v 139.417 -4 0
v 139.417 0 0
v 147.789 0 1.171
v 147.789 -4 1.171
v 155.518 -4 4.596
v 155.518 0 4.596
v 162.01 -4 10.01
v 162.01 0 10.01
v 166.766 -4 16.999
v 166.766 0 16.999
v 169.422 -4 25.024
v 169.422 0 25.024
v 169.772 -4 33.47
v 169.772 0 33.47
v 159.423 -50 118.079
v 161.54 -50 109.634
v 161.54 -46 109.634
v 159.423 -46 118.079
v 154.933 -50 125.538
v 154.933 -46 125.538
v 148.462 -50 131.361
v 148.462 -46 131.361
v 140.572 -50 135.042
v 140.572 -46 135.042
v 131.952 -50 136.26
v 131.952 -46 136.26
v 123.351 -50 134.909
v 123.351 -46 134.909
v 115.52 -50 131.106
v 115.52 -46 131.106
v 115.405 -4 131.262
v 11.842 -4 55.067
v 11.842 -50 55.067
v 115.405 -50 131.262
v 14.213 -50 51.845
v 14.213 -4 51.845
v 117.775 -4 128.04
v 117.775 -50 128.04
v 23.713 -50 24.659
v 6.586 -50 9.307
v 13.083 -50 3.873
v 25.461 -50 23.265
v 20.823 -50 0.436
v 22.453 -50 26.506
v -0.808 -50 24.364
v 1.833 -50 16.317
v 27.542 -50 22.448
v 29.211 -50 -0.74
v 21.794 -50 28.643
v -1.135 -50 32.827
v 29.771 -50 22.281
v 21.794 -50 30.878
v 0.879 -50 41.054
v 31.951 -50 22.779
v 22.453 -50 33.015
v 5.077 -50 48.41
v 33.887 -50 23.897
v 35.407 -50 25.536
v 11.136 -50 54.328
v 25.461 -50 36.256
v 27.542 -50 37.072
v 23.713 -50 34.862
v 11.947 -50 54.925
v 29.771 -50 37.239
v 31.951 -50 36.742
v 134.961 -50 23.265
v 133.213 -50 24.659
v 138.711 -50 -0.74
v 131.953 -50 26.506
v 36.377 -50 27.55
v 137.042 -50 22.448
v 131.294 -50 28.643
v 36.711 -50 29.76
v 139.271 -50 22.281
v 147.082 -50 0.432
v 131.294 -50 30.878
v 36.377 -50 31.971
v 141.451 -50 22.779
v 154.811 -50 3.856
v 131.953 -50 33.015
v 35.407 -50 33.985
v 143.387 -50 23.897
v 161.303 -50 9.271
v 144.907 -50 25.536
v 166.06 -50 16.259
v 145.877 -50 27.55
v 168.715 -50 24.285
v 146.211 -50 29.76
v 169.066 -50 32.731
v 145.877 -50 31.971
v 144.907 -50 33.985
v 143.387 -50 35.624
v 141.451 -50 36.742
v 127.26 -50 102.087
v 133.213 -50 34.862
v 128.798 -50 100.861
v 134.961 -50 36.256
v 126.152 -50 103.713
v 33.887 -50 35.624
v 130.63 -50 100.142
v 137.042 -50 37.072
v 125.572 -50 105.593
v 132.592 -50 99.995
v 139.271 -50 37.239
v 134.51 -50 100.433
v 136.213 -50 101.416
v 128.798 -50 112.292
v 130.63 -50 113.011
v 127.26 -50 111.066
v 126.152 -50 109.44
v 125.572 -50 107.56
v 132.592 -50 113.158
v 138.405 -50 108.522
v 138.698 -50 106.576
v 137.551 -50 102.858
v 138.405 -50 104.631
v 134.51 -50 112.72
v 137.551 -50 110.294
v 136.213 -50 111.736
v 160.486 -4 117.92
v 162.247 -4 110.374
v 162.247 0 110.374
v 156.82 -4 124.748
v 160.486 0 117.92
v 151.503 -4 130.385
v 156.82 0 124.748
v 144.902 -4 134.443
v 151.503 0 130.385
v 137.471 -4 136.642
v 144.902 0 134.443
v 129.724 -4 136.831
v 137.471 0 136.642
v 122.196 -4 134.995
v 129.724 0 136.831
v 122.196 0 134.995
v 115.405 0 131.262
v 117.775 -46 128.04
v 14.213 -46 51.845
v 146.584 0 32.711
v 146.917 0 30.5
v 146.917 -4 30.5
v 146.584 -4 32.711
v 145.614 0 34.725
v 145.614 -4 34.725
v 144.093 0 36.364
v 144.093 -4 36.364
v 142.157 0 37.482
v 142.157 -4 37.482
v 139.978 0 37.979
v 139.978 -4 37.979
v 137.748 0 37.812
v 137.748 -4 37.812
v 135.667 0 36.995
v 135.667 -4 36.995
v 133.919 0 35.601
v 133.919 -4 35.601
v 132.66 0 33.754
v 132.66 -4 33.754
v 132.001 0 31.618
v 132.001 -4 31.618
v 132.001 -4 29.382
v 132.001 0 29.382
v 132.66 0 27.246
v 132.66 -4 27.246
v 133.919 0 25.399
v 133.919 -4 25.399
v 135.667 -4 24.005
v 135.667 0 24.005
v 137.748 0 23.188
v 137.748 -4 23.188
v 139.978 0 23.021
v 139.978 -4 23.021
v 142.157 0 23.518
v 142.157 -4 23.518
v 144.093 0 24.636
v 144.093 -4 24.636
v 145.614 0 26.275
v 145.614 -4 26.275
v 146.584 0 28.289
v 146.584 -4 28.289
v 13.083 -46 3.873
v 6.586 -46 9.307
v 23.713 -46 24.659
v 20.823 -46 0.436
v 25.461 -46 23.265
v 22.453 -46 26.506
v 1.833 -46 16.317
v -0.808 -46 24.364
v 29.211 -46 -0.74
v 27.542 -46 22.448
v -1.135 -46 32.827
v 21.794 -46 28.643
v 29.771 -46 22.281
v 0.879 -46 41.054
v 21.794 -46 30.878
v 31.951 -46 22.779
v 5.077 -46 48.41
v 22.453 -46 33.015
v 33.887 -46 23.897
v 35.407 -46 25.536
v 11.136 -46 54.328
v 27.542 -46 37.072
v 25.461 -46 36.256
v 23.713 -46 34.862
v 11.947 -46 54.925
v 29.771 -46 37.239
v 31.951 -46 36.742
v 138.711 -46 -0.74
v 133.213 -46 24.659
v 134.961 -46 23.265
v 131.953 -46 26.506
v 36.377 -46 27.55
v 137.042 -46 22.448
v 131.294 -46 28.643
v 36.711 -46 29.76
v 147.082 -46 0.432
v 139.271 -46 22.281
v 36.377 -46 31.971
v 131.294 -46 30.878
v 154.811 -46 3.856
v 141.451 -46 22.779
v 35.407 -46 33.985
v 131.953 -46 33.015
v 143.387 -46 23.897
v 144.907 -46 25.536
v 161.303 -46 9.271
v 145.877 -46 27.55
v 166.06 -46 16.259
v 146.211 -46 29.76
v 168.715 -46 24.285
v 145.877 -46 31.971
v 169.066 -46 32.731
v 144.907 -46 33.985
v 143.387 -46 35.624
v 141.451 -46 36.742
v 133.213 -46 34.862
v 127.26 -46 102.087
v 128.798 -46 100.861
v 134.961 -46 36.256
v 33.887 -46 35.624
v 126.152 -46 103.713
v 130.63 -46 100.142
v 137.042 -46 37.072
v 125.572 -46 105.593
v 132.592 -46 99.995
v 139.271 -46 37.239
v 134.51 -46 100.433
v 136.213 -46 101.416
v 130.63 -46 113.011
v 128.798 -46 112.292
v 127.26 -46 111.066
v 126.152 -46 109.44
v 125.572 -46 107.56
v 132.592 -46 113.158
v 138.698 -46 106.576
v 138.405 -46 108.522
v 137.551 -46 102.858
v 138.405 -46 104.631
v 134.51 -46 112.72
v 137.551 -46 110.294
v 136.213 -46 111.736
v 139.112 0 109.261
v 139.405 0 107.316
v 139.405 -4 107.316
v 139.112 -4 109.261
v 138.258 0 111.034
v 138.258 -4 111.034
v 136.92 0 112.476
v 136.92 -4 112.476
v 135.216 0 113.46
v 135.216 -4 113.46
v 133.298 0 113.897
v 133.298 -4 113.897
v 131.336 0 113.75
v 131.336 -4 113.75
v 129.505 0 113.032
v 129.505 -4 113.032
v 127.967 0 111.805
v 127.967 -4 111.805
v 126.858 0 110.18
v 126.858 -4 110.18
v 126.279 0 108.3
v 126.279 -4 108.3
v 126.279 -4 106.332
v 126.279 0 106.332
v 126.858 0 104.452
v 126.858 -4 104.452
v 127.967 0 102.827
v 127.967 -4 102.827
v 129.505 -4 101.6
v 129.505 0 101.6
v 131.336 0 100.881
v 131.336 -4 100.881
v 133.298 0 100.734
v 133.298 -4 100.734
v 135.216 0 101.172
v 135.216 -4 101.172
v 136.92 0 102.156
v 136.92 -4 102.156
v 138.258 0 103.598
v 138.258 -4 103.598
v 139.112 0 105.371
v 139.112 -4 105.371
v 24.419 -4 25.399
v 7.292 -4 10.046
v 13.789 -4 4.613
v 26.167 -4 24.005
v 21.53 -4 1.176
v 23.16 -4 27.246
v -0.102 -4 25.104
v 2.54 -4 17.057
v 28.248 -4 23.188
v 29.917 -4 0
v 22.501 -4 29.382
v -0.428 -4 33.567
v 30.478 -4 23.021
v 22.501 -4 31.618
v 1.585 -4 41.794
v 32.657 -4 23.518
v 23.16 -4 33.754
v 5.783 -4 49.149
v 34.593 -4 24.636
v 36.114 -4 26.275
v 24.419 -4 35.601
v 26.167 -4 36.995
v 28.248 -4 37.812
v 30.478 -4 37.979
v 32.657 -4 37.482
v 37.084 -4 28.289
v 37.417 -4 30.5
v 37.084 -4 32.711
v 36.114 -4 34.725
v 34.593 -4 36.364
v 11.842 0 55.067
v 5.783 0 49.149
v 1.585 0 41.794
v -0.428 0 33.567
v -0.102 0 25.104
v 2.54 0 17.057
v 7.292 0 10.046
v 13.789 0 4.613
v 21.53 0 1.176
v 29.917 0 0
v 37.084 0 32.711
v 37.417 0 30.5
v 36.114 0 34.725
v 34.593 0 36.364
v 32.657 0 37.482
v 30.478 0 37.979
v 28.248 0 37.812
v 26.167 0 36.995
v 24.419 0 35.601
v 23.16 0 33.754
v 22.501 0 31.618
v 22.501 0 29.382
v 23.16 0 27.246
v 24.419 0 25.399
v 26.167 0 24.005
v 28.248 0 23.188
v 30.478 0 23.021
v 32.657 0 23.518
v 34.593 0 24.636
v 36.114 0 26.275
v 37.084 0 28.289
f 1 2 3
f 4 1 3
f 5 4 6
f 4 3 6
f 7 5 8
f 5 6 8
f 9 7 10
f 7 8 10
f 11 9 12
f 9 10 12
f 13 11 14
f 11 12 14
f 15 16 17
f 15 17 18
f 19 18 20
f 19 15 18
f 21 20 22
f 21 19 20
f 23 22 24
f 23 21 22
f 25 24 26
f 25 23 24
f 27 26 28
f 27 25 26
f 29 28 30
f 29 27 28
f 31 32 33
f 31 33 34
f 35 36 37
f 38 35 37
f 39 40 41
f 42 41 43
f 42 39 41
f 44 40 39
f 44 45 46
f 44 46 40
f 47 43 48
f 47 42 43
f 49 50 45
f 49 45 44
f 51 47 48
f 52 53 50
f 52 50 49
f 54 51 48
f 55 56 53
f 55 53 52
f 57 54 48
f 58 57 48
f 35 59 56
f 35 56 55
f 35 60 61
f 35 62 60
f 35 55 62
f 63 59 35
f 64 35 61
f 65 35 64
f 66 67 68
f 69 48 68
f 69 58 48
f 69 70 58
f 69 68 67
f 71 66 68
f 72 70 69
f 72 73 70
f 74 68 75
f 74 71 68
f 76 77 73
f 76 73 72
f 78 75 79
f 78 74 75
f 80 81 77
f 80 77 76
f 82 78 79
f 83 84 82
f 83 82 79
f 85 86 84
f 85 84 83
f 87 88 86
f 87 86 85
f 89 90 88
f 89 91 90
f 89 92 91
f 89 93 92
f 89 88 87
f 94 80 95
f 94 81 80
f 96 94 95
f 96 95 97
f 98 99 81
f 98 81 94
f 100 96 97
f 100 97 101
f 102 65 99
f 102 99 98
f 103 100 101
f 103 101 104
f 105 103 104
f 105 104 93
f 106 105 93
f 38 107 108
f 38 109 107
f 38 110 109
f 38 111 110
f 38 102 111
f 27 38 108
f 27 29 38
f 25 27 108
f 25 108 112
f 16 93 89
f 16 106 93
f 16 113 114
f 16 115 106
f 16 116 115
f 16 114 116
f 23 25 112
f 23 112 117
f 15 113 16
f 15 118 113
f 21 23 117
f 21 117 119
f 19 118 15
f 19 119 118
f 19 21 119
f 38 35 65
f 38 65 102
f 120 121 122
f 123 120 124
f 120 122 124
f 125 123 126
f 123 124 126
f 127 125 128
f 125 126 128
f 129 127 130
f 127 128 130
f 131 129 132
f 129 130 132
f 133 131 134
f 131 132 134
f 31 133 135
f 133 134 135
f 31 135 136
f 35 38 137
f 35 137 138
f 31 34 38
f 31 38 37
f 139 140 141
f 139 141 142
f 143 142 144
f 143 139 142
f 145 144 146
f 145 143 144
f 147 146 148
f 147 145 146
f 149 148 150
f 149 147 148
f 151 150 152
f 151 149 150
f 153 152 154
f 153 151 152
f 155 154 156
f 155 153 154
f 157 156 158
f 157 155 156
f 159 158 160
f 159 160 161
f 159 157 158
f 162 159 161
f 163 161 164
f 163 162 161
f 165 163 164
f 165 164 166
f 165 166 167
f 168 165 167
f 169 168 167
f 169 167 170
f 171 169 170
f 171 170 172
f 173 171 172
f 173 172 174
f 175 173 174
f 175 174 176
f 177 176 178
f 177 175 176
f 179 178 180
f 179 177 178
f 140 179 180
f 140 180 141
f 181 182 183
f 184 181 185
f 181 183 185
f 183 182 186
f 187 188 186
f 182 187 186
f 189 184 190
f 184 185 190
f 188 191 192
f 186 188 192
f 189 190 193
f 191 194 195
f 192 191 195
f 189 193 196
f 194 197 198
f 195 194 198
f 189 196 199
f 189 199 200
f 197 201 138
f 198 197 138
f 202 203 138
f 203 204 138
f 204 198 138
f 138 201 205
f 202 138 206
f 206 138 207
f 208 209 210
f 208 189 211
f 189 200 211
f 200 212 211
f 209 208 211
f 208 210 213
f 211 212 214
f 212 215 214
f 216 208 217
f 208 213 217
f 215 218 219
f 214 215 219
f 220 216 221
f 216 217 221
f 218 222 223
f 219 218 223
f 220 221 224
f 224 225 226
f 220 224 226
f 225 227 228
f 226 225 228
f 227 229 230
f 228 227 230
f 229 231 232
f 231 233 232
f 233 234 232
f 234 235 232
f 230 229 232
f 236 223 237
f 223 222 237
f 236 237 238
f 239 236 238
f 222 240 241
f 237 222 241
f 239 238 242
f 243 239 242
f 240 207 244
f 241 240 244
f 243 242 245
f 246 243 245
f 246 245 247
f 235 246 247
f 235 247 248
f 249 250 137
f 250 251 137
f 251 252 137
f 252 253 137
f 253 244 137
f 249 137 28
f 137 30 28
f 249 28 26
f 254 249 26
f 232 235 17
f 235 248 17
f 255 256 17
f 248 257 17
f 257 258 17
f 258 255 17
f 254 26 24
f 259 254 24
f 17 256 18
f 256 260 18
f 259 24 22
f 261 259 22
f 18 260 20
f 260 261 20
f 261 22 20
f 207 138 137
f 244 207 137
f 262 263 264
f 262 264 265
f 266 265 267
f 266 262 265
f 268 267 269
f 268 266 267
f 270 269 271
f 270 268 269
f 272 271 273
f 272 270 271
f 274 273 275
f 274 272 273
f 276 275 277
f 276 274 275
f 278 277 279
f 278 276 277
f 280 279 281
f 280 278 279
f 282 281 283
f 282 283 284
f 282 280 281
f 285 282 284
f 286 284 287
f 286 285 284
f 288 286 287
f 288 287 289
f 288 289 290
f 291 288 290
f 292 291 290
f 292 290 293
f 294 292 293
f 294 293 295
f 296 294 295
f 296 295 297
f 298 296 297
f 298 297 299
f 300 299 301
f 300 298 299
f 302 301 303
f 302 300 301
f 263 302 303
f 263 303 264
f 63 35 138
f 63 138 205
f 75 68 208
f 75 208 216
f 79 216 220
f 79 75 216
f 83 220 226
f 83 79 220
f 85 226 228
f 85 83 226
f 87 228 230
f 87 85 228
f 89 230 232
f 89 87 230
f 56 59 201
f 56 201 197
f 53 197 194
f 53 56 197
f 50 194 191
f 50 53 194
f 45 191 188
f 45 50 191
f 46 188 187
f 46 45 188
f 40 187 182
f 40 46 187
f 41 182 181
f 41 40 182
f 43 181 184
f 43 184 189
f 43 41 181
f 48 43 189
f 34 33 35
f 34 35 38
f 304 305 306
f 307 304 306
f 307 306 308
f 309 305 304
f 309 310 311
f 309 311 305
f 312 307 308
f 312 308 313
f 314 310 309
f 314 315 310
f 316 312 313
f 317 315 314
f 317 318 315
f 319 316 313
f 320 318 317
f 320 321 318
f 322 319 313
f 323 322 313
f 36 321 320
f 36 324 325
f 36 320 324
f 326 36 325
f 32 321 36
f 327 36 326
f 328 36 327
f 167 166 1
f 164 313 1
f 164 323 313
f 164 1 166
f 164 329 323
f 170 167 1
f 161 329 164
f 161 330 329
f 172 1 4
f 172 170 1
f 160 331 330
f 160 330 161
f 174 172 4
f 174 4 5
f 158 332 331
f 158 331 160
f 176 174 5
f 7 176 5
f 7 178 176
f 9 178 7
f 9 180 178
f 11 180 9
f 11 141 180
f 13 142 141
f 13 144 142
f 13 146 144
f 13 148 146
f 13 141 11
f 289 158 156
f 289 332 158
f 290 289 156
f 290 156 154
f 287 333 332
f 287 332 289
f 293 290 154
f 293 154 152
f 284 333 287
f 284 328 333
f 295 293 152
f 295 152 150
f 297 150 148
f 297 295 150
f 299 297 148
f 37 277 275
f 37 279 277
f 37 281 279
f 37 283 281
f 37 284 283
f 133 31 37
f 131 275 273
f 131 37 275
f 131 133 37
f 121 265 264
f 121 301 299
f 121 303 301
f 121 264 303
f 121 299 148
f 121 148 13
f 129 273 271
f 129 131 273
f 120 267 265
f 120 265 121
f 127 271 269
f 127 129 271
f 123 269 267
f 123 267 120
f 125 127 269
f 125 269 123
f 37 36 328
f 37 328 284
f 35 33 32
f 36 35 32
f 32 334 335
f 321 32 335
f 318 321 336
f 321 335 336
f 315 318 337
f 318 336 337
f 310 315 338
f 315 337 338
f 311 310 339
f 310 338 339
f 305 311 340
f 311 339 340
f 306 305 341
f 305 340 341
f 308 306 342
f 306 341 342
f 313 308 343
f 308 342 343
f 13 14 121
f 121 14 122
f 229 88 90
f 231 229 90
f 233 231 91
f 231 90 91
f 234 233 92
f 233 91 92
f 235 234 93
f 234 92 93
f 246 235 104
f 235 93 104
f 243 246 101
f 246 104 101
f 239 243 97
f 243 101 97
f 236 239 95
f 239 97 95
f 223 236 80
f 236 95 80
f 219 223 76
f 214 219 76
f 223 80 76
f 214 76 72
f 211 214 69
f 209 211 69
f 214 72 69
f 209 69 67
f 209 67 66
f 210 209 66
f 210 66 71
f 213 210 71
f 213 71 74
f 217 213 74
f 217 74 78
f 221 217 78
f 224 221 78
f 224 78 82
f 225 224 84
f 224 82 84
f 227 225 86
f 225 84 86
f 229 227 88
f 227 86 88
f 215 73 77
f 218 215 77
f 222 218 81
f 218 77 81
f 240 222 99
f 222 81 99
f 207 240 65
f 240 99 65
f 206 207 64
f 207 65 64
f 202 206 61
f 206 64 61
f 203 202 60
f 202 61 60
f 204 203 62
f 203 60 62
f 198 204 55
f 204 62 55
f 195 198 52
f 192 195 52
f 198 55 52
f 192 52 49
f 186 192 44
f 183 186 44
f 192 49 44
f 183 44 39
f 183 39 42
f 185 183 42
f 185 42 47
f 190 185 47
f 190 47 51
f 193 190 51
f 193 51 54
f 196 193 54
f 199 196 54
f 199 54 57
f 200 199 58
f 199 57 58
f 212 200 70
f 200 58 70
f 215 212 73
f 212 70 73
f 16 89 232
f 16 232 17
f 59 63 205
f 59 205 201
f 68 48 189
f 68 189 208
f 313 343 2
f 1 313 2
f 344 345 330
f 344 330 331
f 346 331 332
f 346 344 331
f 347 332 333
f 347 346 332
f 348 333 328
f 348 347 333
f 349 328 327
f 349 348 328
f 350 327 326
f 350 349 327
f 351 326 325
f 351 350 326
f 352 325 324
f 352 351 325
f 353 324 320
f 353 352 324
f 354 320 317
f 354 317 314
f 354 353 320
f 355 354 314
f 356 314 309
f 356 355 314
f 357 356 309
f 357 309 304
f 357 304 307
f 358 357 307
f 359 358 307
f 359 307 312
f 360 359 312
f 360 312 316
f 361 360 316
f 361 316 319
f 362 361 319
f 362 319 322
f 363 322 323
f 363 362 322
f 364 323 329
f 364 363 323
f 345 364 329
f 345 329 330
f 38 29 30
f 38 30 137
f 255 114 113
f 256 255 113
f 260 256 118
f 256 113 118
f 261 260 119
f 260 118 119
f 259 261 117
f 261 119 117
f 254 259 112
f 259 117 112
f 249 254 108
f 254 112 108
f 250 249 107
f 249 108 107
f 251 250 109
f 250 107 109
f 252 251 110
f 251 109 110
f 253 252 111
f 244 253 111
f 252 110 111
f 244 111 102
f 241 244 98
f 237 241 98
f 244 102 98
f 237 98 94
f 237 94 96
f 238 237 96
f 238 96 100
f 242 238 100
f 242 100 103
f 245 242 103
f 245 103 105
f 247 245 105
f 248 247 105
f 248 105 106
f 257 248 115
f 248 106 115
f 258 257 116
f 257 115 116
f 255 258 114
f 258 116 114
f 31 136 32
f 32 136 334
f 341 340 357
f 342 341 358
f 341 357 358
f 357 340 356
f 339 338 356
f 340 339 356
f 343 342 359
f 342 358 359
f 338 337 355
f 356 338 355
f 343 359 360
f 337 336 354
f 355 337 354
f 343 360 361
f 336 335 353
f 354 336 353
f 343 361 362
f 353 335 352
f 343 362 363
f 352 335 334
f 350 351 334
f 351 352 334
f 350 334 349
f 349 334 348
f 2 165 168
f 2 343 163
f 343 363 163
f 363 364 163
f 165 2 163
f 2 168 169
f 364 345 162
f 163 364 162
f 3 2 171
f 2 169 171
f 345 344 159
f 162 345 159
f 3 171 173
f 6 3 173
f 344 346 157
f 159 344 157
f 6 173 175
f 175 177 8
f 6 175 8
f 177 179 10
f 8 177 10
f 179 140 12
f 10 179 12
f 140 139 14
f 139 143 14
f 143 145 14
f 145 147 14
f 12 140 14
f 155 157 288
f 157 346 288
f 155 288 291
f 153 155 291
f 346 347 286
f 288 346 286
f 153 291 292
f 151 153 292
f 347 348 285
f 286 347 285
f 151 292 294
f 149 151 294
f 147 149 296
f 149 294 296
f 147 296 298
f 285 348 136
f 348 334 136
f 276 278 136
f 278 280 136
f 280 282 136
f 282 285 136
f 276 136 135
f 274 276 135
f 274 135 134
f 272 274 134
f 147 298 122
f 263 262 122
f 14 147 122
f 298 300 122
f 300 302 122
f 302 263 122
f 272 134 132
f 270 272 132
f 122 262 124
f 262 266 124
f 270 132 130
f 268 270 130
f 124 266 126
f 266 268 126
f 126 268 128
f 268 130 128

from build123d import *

# Parameters (mm, degrees)
F0_R     = 7.5
F0_R_2   = 6.6
F1_DEPTH = 4
F2_W     = 128.572716
F2_H     = 46
F3_DEPTH = 4
F4_R     = 7.5
F4_R_2   = 6.6
F5_DEPTH = 4


with BuildPart() as f1:
    # F0 (on Front) → F1 (new body)
    with BuildSketch(Plane.XZ):
        with BuildLine():
            ThreePointArc((11.842165, 55.067126), (0.938336, 20.988095), (29.917185, 0))
            Line((29.917185, 0), (139.417185, 0))
            ThreePointArc((139.417185, 0), (162.009712, 10.010302), (169.772205, 33.470313))
            Line((169.772205, 33.470313), (162.247026, 110.373628))
            ThreePointArc((162.247026, 110.373628), (144.901939, 134.443184), (115.404857, 131.262349))
            Line((115.404857, 131.262349), (11.842165, 55.067126))
        make_face()
        with Locations((29.917185, 30.5)):
            Circle(F0_R, mode=Mode.SUBTRACT)
        with Locations((139.417185, 30.5)):
            Circle(F0_R, mode=Mode.SUBTRACT)
        with Locations((132.804856, 107.31593)):
            Circle(F0_R_2, mode=Mode.SUBTRACT)
    extrude(amount=F1_DEPTH)

    # F2 (on face) → F3 (join)
    with BuildSketch(Plane(origin=(-22.127081, 0, 30.07459), x_dir=(0.80548, 0, 0.592624), z_dir=(-0.592624, 0, 0.80548))):
        with Locations((106.459057, -27)):
            Rectangle(F2_W, F2_H)
    extrude(amount=-F3_DEPTH)


with BuildPart() as f5:
    # F4 (on face) → F5 (new body)
    with BuildSketch(Plane.XZ.offset(50)):
        with BuildLine():
            ThreePointArc((11.135599, 54.327573), (0.23177, 20.248542), (29.210619, -0.739553))
            Line((29.210619, -0.739553), (138.710619, -0.739553))
            ThreePointArc((138.710619, -0.739553), (161.303146, 9.270749), (169.065639, 32.73076))
            Line((169.065639, 32.73076), (161.54046, 109.634076))
            ThreePointArc((161.54046, 109.634076), (144.65372, 133.494526), (115.519929, 131.105947))
            Line((115.519929, 131.105947), (117.775352, 128.040431))
            Line((117.775352, 128.040431), (14.21266, 51.845208))
            Line((14.21266, 51.845208), (11.94704, 54.924583))
            Line((11.94704, 54.924583), (11.135599, 54.327573))
        make_face()
        with Locations((29.210619, 29.760447)):
            Circle(F4_R, mode=Mode.SUBTRACT)
        with Locations((138.710619, 29.760447)):
            Circle(F4_R, mode=Mode.SUBTRACT)
        with Locations((132.09829, 106.576377)):
            Circle(F4_R_2, mode=Mode.SUBTRACT)
    extrude(amount=-F5_DEPTH)


solid = Compound([f1.part, f5.part])
